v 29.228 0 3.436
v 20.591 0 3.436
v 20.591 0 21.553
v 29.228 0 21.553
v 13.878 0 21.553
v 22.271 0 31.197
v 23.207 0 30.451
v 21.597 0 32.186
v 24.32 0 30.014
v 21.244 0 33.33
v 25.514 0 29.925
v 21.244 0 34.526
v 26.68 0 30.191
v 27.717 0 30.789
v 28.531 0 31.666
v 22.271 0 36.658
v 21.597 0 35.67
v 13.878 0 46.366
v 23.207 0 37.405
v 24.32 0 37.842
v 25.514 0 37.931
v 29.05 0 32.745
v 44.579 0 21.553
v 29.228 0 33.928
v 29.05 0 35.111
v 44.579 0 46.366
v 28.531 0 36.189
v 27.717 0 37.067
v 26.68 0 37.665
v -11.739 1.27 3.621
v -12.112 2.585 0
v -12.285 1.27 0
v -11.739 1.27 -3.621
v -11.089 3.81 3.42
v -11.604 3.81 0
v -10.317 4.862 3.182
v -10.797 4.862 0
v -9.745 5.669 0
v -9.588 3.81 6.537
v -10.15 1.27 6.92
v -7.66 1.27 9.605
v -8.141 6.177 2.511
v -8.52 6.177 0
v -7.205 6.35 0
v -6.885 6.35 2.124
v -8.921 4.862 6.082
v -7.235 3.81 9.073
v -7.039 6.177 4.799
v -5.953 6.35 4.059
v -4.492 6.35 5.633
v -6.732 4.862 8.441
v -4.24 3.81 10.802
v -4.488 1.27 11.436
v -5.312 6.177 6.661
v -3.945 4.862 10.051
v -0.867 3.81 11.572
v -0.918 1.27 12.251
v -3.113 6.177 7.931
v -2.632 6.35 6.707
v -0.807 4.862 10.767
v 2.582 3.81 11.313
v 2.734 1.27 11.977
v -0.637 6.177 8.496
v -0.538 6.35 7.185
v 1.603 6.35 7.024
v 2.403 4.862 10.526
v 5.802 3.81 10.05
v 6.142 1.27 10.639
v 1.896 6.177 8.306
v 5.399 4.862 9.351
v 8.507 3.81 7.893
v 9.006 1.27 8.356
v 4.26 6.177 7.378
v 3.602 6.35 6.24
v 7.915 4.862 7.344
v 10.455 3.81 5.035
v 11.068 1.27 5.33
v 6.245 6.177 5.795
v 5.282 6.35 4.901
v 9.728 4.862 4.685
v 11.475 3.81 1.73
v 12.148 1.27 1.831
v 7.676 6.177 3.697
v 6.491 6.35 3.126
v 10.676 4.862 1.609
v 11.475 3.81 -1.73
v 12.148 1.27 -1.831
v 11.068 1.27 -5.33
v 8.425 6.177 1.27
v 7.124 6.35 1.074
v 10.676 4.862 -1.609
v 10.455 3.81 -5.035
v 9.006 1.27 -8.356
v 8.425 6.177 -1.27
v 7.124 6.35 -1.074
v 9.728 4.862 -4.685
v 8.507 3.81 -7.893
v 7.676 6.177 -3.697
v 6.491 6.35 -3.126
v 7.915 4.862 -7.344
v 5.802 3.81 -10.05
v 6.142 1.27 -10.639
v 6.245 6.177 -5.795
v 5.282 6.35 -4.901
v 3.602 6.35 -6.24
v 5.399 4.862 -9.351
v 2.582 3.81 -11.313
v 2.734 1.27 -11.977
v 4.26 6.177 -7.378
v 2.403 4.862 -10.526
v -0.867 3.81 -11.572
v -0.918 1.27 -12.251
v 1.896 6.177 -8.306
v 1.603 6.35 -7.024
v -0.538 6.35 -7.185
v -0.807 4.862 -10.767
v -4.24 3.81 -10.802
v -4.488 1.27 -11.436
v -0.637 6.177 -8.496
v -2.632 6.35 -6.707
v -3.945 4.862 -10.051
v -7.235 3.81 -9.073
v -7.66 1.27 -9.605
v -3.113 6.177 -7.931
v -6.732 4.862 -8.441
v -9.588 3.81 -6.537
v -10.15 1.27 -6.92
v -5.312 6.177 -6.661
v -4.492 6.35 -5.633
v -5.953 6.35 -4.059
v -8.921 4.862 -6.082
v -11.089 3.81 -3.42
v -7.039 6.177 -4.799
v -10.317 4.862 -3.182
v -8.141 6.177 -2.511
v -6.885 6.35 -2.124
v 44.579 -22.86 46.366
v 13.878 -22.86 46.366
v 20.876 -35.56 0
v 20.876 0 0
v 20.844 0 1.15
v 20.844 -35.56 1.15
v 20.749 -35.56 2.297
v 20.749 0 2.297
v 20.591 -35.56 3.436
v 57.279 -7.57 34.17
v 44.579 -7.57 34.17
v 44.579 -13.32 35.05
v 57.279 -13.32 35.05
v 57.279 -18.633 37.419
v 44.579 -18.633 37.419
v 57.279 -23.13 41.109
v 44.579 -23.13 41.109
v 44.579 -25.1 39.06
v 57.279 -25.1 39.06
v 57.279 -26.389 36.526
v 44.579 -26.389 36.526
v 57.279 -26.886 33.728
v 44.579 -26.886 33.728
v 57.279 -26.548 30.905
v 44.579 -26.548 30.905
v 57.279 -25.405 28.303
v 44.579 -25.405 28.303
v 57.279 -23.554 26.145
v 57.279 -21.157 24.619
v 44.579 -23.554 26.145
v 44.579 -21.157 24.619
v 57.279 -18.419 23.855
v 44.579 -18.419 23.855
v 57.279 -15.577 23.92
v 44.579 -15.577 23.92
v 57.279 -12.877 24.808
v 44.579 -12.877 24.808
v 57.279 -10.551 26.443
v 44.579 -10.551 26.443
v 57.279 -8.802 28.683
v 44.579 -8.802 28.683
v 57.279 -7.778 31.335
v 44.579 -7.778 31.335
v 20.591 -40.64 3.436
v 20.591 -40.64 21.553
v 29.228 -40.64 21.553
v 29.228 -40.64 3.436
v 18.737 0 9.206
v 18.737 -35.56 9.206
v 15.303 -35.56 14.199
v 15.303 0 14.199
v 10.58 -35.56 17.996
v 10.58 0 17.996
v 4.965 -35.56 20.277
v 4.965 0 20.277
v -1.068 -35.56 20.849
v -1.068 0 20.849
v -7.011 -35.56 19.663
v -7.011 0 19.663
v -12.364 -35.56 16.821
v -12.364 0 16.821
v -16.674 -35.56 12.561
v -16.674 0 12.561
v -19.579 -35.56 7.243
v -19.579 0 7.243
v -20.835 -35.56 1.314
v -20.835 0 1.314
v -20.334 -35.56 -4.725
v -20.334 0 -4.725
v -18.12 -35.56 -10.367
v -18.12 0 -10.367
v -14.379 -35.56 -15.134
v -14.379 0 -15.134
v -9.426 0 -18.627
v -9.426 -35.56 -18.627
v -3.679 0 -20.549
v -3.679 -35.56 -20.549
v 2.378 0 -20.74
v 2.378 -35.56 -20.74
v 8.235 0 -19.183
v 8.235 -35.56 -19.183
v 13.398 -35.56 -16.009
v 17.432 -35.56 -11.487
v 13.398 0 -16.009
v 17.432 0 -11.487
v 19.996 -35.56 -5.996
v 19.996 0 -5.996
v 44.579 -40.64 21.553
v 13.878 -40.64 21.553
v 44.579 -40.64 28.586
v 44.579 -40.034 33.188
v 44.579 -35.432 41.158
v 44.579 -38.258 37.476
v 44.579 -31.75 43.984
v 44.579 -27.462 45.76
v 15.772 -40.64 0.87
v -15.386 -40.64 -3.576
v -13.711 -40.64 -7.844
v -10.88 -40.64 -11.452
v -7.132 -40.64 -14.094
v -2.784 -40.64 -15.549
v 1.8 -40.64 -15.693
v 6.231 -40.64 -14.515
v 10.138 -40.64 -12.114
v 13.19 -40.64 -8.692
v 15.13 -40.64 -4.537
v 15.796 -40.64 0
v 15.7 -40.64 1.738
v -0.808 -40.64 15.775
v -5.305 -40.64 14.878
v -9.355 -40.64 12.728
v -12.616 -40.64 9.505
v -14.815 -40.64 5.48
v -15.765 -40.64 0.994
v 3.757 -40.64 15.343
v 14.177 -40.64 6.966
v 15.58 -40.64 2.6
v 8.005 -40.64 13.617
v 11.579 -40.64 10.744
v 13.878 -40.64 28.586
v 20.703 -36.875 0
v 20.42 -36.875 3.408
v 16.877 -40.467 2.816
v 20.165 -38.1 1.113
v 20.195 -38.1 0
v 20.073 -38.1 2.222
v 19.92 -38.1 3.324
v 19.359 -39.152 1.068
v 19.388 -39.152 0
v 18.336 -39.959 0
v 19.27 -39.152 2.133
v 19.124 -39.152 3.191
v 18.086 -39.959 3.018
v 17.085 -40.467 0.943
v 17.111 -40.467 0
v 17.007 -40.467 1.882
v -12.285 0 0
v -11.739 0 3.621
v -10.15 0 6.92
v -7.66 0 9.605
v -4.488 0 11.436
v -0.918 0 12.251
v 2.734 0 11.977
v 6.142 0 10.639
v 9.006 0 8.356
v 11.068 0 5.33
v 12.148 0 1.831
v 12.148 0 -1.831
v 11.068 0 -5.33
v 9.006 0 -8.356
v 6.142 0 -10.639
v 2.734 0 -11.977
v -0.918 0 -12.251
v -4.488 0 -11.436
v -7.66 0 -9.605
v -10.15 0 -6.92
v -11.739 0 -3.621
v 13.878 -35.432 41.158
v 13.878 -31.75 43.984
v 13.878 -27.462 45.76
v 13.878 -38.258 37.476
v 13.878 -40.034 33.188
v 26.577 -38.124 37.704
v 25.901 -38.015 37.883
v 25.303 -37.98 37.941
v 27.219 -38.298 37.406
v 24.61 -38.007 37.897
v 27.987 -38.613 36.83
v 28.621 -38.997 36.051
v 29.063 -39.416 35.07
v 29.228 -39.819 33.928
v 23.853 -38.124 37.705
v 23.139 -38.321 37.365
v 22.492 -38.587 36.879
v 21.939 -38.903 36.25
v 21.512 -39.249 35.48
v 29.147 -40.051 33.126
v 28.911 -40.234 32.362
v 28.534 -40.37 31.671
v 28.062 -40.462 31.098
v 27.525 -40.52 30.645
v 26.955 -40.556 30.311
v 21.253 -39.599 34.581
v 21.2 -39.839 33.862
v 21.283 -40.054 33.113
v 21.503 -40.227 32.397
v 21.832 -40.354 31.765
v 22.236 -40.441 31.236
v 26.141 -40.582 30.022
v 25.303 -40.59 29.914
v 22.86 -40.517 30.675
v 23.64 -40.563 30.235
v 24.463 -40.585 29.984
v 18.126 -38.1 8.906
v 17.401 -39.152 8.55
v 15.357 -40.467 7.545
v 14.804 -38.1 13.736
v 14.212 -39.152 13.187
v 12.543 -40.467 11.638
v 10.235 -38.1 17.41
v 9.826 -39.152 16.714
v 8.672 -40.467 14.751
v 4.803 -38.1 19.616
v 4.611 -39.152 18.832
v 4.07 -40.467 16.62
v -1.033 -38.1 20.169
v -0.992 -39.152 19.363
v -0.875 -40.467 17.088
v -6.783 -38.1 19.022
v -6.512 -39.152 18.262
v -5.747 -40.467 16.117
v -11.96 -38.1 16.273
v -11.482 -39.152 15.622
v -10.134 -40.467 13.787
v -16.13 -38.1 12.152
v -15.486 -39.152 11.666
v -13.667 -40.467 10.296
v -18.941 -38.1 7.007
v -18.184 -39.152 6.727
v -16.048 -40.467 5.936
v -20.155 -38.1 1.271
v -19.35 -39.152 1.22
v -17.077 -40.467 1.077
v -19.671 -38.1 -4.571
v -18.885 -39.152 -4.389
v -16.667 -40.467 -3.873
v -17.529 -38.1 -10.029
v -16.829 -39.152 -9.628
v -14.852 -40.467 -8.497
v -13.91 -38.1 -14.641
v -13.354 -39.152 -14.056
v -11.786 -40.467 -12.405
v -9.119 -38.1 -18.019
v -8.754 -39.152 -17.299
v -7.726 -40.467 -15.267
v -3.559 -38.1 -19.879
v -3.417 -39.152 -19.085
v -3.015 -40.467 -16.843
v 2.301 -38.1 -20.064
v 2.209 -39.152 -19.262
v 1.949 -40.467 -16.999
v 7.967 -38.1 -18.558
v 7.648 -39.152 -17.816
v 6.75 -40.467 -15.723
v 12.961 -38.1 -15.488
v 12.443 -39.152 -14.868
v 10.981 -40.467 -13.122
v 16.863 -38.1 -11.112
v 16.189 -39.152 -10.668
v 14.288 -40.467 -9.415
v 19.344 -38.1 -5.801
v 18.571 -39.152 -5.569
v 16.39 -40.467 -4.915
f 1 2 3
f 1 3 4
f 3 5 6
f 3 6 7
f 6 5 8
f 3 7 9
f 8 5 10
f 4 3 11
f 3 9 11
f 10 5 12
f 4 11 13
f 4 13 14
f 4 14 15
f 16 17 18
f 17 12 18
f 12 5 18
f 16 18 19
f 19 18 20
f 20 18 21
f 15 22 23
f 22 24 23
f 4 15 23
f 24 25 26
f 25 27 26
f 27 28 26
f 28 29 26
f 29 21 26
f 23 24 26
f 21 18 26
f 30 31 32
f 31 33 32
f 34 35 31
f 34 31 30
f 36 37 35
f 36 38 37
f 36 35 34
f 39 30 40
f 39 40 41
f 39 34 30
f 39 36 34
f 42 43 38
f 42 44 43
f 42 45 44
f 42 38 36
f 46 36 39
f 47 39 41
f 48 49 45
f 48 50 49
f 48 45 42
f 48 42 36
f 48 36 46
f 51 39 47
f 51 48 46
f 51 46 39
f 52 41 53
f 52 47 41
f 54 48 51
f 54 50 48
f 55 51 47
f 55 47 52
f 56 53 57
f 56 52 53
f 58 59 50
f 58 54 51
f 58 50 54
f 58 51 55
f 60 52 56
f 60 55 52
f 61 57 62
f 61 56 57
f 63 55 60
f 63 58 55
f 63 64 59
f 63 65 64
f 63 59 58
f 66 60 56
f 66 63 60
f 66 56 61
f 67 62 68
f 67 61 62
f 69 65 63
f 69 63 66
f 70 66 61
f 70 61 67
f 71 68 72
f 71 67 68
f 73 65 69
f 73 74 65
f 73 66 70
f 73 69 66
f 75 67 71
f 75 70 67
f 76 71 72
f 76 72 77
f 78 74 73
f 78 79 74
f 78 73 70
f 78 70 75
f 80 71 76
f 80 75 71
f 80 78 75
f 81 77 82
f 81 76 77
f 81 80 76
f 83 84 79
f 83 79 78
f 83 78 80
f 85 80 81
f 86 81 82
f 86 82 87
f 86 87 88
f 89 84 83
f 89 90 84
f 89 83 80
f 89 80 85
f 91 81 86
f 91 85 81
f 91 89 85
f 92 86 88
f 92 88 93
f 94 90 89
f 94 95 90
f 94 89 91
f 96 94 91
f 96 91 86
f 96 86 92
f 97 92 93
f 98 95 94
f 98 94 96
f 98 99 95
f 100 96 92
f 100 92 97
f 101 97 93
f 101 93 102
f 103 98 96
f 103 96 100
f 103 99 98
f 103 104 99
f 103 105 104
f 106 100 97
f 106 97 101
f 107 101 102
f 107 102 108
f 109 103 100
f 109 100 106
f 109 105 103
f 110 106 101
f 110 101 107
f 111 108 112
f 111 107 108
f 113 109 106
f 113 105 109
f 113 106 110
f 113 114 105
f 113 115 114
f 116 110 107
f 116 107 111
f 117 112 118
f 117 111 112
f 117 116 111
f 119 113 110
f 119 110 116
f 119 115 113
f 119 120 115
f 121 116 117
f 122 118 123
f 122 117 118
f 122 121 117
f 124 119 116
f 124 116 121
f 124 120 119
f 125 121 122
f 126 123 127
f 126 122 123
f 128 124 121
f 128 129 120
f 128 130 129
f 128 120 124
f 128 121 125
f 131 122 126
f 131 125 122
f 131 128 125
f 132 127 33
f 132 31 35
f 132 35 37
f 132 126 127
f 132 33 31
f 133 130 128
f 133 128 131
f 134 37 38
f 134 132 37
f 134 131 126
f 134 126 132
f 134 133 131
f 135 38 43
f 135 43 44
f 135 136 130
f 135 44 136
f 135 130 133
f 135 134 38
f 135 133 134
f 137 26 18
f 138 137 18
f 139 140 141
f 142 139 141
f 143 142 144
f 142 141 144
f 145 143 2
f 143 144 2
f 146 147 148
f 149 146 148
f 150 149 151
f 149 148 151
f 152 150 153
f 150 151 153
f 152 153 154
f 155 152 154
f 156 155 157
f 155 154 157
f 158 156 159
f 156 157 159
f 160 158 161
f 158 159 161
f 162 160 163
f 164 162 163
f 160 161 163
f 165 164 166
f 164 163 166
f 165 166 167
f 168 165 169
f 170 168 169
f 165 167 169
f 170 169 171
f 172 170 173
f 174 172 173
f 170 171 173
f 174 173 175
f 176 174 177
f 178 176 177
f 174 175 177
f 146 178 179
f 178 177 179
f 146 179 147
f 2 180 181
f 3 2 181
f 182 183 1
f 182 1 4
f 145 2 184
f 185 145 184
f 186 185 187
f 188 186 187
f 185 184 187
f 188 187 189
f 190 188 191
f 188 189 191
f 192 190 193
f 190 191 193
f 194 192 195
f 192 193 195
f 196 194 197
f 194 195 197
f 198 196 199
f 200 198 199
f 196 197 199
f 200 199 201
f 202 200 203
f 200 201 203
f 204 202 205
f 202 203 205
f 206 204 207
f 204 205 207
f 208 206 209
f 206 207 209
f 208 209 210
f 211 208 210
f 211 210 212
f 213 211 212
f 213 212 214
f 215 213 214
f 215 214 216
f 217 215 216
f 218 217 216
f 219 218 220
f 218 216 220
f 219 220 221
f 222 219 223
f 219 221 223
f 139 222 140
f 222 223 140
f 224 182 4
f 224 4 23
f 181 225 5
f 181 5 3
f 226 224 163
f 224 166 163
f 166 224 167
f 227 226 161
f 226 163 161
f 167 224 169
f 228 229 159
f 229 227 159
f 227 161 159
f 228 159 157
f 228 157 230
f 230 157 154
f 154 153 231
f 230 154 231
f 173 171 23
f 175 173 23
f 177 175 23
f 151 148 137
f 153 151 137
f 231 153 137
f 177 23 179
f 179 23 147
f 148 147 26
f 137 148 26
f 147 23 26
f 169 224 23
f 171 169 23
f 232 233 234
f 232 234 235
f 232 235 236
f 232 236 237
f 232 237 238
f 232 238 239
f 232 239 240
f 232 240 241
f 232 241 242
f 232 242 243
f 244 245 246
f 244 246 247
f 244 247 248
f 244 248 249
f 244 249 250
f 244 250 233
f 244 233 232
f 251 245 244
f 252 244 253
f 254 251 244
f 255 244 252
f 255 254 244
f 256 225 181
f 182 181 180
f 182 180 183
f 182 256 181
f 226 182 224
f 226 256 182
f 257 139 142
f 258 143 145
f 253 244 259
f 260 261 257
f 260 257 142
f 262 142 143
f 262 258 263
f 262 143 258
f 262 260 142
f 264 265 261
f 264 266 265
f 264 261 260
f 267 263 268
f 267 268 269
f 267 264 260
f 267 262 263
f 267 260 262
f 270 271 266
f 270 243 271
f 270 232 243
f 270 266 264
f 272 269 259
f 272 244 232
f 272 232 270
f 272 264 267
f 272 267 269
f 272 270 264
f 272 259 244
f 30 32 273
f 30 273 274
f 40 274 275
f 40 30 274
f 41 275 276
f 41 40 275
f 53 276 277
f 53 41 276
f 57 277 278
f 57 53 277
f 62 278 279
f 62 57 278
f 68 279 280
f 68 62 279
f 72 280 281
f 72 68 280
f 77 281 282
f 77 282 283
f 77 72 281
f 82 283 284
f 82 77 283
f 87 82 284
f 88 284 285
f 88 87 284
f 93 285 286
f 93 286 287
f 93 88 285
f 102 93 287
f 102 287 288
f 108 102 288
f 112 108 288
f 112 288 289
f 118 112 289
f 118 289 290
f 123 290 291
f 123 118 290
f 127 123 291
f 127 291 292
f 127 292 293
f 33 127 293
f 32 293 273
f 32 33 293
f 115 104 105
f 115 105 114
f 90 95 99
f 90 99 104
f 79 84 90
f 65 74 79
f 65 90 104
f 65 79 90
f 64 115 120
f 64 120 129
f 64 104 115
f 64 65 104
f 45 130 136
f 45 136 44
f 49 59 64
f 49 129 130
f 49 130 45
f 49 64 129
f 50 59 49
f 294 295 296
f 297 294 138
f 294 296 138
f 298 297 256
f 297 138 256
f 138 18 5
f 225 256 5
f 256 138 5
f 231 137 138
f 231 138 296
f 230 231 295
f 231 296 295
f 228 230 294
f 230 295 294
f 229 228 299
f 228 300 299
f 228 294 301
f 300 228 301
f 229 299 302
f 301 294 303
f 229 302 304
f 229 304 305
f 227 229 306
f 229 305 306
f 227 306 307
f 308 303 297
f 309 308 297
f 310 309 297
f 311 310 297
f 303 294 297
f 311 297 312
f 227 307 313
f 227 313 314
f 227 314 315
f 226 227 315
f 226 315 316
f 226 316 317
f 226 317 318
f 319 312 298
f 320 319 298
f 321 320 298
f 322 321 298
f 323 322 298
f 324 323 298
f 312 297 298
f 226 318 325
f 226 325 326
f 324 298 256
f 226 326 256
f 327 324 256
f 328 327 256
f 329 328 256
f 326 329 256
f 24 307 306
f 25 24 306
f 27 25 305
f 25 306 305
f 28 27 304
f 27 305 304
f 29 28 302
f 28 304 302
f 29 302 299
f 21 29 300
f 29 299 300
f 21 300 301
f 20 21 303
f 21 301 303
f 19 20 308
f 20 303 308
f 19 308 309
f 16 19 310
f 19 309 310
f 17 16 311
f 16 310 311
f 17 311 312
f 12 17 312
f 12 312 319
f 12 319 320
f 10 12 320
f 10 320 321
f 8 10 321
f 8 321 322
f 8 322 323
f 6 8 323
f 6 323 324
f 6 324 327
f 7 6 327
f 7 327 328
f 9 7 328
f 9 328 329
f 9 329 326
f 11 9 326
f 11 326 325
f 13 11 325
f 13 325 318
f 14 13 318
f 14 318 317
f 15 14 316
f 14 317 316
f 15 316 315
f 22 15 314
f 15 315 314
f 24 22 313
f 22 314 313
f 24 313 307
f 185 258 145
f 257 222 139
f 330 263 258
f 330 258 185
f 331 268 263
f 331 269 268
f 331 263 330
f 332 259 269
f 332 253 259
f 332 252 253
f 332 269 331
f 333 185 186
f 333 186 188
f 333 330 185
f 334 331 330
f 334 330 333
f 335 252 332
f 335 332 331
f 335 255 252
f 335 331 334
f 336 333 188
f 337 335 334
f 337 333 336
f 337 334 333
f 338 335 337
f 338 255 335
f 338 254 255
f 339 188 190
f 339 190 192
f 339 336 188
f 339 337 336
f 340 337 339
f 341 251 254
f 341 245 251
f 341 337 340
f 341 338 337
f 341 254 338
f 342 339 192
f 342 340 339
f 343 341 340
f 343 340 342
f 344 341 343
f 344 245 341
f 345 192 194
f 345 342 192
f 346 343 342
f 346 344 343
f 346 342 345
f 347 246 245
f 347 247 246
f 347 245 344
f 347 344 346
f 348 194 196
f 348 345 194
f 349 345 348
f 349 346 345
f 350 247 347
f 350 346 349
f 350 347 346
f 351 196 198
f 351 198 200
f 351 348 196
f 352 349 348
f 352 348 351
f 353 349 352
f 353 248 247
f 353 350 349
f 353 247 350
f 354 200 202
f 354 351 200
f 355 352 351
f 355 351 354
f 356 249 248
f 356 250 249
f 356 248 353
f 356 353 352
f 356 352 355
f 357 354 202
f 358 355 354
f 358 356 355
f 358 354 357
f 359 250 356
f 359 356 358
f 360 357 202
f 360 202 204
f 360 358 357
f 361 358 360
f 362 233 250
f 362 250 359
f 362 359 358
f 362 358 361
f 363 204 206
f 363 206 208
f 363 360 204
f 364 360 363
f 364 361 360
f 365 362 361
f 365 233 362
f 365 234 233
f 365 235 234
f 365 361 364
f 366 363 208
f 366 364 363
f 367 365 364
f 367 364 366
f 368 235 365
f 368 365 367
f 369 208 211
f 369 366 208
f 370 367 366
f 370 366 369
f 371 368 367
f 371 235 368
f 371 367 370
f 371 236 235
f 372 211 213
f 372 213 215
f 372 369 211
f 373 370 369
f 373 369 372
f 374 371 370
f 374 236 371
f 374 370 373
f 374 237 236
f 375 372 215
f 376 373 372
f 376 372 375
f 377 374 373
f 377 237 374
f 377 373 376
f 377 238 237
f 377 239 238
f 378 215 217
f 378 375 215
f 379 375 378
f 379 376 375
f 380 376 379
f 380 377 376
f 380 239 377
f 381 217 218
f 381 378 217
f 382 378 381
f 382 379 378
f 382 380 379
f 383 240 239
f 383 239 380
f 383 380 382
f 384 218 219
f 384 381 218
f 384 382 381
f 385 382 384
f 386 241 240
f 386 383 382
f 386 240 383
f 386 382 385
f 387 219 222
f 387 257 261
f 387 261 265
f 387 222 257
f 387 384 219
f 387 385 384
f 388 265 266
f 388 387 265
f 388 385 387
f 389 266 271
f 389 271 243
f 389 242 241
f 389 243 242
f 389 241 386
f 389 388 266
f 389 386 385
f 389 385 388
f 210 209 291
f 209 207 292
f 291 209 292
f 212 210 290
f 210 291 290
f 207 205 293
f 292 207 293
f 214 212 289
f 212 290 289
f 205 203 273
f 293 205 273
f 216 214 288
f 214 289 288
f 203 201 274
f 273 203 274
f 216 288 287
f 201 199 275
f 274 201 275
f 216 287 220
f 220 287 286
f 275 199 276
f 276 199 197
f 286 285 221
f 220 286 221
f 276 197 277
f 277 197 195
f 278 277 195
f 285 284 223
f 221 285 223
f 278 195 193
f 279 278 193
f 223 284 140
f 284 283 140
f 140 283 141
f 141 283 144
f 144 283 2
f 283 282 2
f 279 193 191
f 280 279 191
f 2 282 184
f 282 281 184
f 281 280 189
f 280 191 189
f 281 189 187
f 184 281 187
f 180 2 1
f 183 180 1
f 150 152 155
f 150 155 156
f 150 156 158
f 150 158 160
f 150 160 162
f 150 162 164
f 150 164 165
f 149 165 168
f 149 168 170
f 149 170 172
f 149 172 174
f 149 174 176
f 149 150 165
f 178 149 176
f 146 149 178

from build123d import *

# Parameters (mm, degrees)
F1_DEPTH  = 40.64
F0_W      = 8.6371588569
F0_H      = 18.1170738973
F2_R      = 5.08
F3_R      = 12.2849564613
F4_DEPTH  = 6.35
F5_R      = 5.08
F6_R      = 17.78
F8_DEPTH  = 12.7
F9_R      = 4.014567472
F10_DEPTH = 46.991


with BuildPart() as f1:
    # F0 (on Front) → F1 (new body)
    with BuildSketch(Plane.XZ):
        with BuildLine():
            ThreePointArc((20.59119781, 3.4362115226), (-20.8046345697, -1.7239945757), (20.8759425387, 0))
            ThreePointArc((20.8759425387, 0), (20.8046345697, 1.7239945757), (20.59119781, 3.4362115226))
        make_face()
    extrude(amount=F1_DEPTH)

    # F2
    f2_edges = [f1.edges().sort_by_distance(p)[0] for p in [
        (-20.875943, -40.64, 0),
    ]]
    fillet(f2_edges, radius=F2_R)

    # F3 (on face) → F4 (join, symmetric)
    with BuildSketch(Plane(origin=(0, 0, 0), x_dir=(-1, 0, 0), z_dir=(0, 1, 0))):
        Circle(F3_R)
    extrude(amount=F4_DEPTH, both=True)

    # F5
    f5_edges = [f1.edges().sort_by_distance(p)[0] for p in [
        (12.284956, 6.35, 0),
    ]]
    fillet(f5_edges, radius=F5_R)


with BuildPart() as f1b:
    # F0 (on Front) → F1, piece 2 (new body)
    with BuildSketch(Plane.XZ):
        with Locations((24.9097772384, 12.4947484713)):
            Rectangle(F0_W, F0_H)
        Polygon((13.8782132417, 21.5532854199), (20.59119781, 21.5532854199), (29.2283566669, 21.5532854199), (44.578500092, 21.5532854199), (44.578500092, 46.3658496737), (13.8782132417, 46.3658496737), align=None)
    extrude(amount=F1_DEPTH)

    # F6
    f6_edges = [f1b.edges().sort_by_distance(p)[0] for p in [
        (29.228357, -40.64, 46.36585),
    ]]
    fillet(f6_edges, radius=F6_R)

    # F7 (on face) → F8 (join)
    with BuildSketch(Plane.YZ.offset(44.578500092)):
        with BuildLine():
            ThreePointArc((-7.5699351728, 34.1698415577), (-16.0560709471, 36.0564102607), (-23.1303535402, 41.1089509726))
            ThreePointArc((-23.1303535402, 41.1089509726), (-21.1565768964, 24.6189185437), (-7.5699351728, 34.1698415577))
        make_face()
    extrude(amount=F8_DEPTH)

    # F9 (on face) → F10 (cut, through all)
    with BuildSketch(Plane.XZ.offset(40.64)):
        with Locations((25.2137891948, 33.9278802276)):
            Circle(F9_R)
    extrude(amount=-F10_DEPTH, mode=Mode.SUBTRACT)


solid = Compound([f1.part, f1b.part])
